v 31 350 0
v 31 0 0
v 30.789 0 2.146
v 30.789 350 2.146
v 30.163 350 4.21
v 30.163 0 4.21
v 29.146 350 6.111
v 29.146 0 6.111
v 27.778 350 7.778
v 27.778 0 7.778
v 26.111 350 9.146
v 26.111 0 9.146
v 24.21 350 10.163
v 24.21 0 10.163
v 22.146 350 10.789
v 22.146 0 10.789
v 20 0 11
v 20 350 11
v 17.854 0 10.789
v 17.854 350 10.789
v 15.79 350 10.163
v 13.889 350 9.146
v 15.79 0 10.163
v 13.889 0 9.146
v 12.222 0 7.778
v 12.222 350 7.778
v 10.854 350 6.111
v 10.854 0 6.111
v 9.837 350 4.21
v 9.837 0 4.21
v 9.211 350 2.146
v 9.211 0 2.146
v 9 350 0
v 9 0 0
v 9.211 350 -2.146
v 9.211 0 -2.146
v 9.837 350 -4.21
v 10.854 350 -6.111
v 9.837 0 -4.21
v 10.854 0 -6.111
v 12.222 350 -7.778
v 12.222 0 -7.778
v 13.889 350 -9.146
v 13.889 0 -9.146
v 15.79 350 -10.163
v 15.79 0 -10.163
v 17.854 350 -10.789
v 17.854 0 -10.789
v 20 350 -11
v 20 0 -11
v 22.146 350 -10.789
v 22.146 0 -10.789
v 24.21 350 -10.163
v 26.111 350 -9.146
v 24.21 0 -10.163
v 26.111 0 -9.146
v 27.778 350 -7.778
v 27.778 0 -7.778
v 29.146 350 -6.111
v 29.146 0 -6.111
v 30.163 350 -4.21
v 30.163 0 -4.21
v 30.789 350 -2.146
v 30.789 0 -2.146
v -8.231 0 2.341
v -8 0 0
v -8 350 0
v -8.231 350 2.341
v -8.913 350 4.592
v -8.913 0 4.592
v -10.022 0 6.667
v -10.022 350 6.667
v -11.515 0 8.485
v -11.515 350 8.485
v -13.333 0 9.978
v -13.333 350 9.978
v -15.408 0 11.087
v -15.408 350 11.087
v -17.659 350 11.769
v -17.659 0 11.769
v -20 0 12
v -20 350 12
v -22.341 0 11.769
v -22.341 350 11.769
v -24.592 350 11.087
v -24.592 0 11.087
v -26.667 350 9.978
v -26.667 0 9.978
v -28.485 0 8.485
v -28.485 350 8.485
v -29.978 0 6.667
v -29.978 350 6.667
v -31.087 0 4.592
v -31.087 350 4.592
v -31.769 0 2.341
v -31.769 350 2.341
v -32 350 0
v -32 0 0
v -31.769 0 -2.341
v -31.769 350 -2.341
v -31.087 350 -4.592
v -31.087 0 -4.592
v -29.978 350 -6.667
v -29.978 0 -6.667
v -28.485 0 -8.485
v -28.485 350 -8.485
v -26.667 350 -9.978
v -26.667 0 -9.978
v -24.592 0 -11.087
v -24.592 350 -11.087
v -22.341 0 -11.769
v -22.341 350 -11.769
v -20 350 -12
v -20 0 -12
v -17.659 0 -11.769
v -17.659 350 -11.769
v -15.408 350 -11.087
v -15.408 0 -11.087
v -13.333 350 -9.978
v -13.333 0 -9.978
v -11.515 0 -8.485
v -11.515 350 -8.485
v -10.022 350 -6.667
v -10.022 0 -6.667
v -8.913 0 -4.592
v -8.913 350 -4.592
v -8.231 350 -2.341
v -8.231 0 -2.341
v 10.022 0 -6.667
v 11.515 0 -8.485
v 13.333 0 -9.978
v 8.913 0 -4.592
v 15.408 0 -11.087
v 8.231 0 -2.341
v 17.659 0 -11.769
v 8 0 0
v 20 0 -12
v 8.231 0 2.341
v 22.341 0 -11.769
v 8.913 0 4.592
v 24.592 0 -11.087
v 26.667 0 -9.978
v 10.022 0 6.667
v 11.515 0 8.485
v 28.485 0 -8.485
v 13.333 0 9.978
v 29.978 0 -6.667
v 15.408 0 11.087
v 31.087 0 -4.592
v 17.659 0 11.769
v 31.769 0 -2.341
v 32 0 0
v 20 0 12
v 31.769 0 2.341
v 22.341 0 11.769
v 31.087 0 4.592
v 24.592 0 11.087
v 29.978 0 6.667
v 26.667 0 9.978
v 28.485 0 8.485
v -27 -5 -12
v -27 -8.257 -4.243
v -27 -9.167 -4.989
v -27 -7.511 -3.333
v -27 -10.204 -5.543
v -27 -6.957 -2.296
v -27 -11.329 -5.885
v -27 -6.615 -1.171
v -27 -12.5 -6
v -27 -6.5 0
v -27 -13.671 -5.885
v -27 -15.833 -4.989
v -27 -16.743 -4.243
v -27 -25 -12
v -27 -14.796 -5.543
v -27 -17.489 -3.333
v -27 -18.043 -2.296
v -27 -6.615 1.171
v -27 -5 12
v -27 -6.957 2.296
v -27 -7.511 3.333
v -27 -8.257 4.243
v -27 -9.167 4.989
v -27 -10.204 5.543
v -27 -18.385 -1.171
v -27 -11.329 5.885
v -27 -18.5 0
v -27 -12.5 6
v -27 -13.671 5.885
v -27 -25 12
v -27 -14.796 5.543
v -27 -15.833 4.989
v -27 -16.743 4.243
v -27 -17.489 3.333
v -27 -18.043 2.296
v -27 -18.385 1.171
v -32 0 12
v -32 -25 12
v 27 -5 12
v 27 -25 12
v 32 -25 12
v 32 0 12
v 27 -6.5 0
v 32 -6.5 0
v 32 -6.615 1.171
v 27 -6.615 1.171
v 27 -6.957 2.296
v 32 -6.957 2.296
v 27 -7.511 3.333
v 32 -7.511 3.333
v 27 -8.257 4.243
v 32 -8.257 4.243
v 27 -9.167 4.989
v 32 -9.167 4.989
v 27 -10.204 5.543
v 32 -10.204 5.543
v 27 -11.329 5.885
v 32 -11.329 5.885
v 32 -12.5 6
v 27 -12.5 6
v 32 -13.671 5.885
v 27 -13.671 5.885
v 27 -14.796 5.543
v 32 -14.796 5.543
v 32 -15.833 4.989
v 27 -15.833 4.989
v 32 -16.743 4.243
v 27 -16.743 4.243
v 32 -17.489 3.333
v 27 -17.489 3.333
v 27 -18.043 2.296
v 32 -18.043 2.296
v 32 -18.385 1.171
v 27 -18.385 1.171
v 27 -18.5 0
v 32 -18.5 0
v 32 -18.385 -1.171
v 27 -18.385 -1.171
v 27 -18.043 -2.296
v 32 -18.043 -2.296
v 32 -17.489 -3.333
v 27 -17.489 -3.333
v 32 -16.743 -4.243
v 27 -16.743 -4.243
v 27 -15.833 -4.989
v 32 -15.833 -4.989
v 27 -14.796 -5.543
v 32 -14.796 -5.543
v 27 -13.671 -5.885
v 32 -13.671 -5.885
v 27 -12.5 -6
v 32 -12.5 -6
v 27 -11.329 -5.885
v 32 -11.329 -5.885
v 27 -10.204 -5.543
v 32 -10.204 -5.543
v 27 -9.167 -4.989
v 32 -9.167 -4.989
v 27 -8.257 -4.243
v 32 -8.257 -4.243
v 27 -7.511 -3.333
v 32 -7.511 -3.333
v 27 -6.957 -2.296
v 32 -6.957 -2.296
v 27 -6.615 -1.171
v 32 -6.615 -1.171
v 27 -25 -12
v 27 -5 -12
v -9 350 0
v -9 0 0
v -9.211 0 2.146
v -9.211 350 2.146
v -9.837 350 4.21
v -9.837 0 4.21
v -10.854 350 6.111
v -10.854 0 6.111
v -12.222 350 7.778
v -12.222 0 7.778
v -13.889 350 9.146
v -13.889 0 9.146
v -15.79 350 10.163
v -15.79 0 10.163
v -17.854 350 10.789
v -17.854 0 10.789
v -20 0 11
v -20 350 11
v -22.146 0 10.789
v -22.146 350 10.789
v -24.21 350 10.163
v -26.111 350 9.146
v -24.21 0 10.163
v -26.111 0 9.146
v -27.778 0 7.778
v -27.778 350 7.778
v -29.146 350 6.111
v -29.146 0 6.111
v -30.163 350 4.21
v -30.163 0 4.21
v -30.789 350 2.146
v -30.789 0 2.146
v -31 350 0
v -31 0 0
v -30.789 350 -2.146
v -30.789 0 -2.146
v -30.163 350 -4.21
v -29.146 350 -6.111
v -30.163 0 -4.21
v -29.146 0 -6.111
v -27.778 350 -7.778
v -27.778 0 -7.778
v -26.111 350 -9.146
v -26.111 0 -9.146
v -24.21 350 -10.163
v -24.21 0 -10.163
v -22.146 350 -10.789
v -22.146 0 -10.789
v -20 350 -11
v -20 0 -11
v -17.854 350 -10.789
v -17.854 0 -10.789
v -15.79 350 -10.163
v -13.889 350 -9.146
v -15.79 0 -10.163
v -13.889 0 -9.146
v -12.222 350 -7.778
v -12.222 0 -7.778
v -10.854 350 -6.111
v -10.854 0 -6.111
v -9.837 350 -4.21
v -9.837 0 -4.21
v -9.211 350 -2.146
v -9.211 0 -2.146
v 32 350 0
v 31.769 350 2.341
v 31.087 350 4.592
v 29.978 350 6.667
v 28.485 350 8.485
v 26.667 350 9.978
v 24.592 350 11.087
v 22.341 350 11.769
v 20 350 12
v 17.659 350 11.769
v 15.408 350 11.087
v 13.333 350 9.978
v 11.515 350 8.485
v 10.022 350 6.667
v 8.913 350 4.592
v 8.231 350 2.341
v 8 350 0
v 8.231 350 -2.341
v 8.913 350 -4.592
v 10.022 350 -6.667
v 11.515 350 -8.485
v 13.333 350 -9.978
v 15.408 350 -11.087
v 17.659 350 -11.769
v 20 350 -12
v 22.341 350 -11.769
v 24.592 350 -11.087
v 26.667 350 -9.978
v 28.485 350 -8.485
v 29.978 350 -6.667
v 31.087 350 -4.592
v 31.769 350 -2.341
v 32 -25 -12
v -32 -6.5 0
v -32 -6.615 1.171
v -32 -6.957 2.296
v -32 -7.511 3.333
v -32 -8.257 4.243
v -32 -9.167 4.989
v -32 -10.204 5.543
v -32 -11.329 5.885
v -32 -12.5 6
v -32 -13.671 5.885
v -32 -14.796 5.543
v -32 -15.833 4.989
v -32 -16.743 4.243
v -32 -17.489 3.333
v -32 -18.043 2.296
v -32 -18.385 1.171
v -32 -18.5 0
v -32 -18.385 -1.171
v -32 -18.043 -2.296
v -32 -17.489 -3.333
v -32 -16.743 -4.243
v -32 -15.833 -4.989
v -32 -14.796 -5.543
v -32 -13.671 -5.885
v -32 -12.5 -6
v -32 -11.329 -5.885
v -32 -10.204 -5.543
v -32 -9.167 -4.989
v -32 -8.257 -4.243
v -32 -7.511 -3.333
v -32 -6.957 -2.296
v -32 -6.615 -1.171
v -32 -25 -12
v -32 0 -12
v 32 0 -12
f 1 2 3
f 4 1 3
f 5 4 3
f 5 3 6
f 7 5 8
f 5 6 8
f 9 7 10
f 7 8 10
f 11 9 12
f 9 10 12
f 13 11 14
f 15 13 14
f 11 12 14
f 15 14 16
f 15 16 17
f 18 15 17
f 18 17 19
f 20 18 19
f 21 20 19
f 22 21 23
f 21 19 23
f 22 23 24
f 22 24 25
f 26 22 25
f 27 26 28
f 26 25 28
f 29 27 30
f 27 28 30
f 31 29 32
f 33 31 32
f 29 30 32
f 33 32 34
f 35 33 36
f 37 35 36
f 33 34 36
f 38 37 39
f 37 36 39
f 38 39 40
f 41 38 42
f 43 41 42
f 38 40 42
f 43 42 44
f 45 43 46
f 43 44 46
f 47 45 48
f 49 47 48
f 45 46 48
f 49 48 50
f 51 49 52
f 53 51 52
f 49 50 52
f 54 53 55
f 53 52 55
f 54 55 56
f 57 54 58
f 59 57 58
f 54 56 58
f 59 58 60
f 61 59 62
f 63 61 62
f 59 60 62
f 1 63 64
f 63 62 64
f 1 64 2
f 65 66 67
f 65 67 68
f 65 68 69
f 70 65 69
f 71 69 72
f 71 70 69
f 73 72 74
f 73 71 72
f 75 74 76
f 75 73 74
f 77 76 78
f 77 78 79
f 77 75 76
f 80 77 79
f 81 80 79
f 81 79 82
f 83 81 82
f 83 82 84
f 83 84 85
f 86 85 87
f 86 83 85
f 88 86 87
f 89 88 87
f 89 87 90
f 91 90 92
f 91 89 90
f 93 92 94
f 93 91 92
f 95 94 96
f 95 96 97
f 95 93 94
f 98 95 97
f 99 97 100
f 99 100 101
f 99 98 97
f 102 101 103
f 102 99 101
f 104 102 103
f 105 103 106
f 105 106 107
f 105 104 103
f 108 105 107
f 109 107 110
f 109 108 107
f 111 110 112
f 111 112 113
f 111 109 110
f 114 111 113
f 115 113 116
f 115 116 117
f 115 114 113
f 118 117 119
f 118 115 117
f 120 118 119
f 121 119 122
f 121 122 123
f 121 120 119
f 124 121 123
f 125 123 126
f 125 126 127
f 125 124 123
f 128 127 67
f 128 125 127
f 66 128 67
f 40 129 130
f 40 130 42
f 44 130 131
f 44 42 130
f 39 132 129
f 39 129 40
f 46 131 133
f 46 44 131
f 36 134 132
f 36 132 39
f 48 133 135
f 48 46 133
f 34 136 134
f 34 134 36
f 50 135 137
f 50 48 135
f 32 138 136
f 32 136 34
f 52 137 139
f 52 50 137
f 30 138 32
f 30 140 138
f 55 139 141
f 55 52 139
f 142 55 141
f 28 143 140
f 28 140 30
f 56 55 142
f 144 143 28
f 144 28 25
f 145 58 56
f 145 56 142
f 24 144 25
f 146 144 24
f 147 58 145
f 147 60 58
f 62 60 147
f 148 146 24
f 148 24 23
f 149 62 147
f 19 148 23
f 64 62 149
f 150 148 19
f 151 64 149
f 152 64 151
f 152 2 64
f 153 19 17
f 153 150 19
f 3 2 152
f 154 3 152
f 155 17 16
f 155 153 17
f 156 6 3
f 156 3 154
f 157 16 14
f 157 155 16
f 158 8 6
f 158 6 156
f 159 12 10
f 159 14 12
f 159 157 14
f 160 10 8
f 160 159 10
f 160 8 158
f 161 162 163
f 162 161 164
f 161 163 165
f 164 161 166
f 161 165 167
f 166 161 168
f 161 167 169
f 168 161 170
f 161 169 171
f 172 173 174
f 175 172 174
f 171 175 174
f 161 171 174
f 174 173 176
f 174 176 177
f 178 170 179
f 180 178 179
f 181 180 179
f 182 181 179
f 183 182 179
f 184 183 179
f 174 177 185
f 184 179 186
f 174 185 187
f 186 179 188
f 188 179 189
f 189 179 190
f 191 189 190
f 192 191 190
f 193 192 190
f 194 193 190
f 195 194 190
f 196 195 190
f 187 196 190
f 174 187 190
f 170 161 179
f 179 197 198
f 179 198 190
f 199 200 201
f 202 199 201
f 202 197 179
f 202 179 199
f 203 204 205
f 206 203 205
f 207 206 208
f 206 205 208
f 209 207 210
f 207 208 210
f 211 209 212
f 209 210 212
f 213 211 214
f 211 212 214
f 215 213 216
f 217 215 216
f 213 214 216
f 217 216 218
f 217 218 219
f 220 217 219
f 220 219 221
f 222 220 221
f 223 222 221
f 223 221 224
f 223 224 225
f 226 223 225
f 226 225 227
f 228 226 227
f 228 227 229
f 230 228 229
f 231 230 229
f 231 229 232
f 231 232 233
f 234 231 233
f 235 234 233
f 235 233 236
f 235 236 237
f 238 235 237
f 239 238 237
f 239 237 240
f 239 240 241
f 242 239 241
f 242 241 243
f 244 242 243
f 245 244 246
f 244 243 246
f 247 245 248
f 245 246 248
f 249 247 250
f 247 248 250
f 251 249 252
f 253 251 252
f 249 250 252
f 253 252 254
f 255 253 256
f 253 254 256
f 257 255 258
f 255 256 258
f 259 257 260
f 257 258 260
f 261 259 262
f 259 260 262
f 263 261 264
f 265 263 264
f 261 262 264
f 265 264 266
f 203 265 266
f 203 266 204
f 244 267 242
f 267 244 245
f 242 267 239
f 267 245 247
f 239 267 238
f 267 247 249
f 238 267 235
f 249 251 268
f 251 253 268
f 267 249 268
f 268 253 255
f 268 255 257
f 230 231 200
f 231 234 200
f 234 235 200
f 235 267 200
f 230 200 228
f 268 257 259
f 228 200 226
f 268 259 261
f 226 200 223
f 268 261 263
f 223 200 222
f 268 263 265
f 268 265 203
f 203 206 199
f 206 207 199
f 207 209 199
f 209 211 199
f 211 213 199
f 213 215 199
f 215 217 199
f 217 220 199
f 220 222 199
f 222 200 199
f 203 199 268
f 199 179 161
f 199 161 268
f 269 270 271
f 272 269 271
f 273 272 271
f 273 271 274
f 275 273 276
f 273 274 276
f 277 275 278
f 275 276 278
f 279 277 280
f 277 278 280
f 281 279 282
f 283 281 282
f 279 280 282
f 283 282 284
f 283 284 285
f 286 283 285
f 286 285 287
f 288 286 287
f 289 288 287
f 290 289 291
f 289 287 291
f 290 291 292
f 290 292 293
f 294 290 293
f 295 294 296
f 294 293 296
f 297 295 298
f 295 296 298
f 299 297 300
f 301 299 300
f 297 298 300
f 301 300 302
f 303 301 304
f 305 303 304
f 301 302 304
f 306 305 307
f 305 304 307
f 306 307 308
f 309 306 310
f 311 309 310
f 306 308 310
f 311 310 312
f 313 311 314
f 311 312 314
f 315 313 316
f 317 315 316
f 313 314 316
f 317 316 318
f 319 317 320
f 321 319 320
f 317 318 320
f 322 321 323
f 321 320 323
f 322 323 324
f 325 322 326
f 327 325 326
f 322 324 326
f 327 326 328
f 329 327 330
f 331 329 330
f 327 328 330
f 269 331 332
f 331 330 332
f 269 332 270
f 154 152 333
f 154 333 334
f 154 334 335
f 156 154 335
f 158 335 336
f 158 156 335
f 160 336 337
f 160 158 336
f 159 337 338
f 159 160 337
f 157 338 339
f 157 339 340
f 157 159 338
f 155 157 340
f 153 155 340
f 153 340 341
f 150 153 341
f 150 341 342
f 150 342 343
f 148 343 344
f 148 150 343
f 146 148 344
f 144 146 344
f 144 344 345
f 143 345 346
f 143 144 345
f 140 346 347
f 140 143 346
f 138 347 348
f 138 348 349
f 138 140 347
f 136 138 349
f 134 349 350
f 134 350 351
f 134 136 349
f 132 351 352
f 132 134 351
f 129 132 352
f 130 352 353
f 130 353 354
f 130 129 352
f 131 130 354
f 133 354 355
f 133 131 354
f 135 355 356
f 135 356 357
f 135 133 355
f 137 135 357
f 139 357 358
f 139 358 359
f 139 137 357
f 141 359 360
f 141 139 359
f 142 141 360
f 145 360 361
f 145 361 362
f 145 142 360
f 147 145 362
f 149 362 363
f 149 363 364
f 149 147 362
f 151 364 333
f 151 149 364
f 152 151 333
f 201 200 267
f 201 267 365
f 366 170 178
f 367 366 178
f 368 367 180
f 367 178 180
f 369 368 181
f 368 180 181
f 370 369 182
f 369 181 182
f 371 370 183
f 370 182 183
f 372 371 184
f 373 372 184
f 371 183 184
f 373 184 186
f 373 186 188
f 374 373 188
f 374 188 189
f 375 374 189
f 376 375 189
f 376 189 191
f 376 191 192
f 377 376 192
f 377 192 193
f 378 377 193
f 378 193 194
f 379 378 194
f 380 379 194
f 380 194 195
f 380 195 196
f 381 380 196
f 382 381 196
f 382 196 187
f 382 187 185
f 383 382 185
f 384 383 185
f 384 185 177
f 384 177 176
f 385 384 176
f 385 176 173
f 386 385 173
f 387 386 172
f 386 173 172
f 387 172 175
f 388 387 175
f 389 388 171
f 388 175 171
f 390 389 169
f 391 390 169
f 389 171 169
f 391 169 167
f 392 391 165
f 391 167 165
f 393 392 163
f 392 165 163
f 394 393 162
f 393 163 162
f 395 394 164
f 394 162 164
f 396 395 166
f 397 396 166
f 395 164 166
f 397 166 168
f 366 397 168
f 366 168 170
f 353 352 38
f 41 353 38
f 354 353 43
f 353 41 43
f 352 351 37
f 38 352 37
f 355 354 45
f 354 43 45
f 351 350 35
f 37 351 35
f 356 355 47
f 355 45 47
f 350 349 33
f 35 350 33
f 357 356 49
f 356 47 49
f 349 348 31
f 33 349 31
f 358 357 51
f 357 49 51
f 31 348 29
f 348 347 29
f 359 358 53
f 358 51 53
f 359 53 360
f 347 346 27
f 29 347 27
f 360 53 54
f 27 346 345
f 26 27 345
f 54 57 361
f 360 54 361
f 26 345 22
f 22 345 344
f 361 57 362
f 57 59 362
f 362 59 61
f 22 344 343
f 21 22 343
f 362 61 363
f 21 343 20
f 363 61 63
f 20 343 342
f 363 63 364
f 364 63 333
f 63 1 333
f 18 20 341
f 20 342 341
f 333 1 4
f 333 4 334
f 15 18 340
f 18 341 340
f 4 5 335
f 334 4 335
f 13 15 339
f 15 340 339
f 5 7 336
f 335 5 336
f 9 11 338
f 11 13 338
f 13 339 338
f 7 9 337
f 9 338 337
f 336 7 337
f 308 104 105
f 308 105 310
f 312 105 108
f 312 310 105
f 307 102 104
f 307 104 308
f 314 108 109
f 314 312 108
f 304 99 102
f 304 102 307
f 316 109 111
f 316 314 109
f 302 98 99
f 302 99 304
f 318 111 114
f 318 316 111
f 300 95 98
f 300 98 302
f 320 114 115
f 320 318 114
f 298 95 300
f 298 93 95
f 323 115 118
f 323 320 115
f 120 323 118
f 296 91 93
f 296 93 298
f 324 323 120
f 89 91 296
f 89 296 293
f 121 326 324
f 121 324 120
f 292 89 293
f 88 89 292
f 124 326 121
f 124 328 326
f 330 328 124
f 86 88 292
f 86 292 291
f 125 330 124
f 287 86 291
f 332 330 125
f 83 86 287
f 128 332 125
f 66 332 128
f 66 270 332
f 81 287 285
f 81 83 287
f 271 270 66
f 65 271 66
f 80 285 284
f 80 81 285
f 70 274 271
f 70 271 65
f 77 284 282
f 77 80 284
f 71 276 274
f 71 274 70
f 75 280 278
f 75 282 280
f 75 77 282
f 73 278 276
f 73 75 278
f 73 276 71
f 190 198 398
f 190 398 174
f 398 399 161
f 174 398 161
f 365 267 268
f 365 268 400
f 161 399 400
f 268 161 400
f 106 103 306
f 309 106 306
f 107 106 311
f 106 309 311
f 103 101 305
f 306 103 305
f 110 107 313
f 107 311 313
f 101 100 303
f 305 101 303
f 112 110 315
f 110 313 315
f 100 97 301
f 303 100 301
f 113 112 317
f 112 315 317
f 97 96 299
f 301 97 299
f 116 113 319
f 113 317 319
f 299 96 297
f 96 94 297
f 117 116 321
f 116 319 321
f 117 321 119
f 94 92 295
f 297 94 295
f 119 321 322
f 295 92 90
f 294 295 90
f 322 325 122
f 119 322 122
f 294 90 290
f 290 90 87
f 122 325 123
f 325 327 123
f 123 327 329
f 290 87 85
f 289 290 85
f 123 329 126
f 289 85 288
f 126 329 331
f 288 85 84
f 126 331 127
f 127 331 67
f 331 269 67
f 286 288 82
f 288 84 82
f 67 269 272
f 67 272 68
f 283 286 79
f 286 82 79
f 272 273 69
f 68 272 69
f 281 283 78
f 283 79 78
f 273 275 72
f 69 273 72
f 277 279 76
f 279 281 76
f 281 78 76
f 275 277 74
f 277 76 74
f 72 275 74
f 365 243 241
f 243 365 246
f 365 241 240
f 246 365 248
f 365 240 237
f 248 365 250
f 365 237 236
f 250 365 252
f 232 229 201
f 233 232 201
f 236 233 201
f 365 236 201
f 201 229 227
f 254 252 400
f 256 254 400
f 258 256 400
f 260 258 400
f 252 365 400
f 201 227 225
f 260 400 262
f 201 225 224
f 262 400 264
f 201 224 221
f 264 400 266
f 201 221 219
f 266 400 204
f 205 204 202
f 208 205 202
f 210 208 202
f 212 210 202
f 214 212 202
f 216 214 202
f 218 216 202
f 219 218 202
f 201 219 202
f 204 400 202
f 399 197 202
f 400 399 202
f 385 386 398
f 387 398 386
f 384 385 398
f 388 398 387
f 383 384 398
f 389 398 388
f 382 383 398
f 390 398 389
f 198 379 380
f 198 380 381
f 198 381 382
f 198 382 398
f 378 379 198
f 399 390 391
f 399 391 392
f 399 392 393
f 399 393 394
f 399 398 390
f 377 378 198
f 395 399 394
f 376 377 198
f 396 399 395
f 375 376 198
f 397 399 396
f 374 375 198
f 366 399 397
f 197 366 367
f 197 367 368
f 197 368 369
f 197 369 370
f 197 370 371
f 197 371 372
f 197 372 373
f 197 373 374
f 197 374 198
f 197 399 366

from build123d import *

# Parameters (mm, degrees)
F0_R     = 12
F0_R_2   = 11
F1_DEPTH = 350
F2_W     = 64
F2_H     = 24
F3_DEPTH = 25
F4_R     = 6
F5_DEPTH = 64.001
F6_W     = 54
F6_H     = 3
F6_H_2   = 20
F7_DEPTH = 24.001


with BuildPart() as f1:
    # F0 (on Front) → F1 (new body)
    with BuildSketch(Plane.XZ):
        with Locations((-20, 0)):
            Circle(F0_R)
        with Locations((-20, 0)):
            Circle(F0_R_2, mode=Mode.SUBTRACT)
        with Locations((20, 0)):
            Circle(F0_R)
        with Locations((20, 0)):
            Circle(F0_R_2, mode=Mode.SUBTRACT)
    extrude(amount=-F1_DEPTH)


with BuildPart() as f3:
    # F2 (on Front) → F3 (new body)
    with BuildSketch(Plane.XZ):
        Rectangle(F2_W, F2_H)
    extrude(amount=F3_DEPTH)

    # F4 (on face) → F5 (cut, through all)
    with BuildSketch(Plane.YZ.offset(32)):
        with Locations((-12.5, 0)):
            Circle(F4_R)
    extrude(amount=-F5_DEPTH, mode=Mode.SUBTRACT)

    # F6 (on face) → F7 (cut, through all)
    with BuildSketch(Plane.XY.offset(12)):
        with Locations((0, -26.5)):
            Rectangle(F6_W, F6_H)
        with Locations((0, -15)):
            Rectangle(F6_W, F6_H_2)
    extrude(amount=-F7_DEPTH, mode=Mode.SUBTRACT)


solid = Compound([f1.part, f3.part])
